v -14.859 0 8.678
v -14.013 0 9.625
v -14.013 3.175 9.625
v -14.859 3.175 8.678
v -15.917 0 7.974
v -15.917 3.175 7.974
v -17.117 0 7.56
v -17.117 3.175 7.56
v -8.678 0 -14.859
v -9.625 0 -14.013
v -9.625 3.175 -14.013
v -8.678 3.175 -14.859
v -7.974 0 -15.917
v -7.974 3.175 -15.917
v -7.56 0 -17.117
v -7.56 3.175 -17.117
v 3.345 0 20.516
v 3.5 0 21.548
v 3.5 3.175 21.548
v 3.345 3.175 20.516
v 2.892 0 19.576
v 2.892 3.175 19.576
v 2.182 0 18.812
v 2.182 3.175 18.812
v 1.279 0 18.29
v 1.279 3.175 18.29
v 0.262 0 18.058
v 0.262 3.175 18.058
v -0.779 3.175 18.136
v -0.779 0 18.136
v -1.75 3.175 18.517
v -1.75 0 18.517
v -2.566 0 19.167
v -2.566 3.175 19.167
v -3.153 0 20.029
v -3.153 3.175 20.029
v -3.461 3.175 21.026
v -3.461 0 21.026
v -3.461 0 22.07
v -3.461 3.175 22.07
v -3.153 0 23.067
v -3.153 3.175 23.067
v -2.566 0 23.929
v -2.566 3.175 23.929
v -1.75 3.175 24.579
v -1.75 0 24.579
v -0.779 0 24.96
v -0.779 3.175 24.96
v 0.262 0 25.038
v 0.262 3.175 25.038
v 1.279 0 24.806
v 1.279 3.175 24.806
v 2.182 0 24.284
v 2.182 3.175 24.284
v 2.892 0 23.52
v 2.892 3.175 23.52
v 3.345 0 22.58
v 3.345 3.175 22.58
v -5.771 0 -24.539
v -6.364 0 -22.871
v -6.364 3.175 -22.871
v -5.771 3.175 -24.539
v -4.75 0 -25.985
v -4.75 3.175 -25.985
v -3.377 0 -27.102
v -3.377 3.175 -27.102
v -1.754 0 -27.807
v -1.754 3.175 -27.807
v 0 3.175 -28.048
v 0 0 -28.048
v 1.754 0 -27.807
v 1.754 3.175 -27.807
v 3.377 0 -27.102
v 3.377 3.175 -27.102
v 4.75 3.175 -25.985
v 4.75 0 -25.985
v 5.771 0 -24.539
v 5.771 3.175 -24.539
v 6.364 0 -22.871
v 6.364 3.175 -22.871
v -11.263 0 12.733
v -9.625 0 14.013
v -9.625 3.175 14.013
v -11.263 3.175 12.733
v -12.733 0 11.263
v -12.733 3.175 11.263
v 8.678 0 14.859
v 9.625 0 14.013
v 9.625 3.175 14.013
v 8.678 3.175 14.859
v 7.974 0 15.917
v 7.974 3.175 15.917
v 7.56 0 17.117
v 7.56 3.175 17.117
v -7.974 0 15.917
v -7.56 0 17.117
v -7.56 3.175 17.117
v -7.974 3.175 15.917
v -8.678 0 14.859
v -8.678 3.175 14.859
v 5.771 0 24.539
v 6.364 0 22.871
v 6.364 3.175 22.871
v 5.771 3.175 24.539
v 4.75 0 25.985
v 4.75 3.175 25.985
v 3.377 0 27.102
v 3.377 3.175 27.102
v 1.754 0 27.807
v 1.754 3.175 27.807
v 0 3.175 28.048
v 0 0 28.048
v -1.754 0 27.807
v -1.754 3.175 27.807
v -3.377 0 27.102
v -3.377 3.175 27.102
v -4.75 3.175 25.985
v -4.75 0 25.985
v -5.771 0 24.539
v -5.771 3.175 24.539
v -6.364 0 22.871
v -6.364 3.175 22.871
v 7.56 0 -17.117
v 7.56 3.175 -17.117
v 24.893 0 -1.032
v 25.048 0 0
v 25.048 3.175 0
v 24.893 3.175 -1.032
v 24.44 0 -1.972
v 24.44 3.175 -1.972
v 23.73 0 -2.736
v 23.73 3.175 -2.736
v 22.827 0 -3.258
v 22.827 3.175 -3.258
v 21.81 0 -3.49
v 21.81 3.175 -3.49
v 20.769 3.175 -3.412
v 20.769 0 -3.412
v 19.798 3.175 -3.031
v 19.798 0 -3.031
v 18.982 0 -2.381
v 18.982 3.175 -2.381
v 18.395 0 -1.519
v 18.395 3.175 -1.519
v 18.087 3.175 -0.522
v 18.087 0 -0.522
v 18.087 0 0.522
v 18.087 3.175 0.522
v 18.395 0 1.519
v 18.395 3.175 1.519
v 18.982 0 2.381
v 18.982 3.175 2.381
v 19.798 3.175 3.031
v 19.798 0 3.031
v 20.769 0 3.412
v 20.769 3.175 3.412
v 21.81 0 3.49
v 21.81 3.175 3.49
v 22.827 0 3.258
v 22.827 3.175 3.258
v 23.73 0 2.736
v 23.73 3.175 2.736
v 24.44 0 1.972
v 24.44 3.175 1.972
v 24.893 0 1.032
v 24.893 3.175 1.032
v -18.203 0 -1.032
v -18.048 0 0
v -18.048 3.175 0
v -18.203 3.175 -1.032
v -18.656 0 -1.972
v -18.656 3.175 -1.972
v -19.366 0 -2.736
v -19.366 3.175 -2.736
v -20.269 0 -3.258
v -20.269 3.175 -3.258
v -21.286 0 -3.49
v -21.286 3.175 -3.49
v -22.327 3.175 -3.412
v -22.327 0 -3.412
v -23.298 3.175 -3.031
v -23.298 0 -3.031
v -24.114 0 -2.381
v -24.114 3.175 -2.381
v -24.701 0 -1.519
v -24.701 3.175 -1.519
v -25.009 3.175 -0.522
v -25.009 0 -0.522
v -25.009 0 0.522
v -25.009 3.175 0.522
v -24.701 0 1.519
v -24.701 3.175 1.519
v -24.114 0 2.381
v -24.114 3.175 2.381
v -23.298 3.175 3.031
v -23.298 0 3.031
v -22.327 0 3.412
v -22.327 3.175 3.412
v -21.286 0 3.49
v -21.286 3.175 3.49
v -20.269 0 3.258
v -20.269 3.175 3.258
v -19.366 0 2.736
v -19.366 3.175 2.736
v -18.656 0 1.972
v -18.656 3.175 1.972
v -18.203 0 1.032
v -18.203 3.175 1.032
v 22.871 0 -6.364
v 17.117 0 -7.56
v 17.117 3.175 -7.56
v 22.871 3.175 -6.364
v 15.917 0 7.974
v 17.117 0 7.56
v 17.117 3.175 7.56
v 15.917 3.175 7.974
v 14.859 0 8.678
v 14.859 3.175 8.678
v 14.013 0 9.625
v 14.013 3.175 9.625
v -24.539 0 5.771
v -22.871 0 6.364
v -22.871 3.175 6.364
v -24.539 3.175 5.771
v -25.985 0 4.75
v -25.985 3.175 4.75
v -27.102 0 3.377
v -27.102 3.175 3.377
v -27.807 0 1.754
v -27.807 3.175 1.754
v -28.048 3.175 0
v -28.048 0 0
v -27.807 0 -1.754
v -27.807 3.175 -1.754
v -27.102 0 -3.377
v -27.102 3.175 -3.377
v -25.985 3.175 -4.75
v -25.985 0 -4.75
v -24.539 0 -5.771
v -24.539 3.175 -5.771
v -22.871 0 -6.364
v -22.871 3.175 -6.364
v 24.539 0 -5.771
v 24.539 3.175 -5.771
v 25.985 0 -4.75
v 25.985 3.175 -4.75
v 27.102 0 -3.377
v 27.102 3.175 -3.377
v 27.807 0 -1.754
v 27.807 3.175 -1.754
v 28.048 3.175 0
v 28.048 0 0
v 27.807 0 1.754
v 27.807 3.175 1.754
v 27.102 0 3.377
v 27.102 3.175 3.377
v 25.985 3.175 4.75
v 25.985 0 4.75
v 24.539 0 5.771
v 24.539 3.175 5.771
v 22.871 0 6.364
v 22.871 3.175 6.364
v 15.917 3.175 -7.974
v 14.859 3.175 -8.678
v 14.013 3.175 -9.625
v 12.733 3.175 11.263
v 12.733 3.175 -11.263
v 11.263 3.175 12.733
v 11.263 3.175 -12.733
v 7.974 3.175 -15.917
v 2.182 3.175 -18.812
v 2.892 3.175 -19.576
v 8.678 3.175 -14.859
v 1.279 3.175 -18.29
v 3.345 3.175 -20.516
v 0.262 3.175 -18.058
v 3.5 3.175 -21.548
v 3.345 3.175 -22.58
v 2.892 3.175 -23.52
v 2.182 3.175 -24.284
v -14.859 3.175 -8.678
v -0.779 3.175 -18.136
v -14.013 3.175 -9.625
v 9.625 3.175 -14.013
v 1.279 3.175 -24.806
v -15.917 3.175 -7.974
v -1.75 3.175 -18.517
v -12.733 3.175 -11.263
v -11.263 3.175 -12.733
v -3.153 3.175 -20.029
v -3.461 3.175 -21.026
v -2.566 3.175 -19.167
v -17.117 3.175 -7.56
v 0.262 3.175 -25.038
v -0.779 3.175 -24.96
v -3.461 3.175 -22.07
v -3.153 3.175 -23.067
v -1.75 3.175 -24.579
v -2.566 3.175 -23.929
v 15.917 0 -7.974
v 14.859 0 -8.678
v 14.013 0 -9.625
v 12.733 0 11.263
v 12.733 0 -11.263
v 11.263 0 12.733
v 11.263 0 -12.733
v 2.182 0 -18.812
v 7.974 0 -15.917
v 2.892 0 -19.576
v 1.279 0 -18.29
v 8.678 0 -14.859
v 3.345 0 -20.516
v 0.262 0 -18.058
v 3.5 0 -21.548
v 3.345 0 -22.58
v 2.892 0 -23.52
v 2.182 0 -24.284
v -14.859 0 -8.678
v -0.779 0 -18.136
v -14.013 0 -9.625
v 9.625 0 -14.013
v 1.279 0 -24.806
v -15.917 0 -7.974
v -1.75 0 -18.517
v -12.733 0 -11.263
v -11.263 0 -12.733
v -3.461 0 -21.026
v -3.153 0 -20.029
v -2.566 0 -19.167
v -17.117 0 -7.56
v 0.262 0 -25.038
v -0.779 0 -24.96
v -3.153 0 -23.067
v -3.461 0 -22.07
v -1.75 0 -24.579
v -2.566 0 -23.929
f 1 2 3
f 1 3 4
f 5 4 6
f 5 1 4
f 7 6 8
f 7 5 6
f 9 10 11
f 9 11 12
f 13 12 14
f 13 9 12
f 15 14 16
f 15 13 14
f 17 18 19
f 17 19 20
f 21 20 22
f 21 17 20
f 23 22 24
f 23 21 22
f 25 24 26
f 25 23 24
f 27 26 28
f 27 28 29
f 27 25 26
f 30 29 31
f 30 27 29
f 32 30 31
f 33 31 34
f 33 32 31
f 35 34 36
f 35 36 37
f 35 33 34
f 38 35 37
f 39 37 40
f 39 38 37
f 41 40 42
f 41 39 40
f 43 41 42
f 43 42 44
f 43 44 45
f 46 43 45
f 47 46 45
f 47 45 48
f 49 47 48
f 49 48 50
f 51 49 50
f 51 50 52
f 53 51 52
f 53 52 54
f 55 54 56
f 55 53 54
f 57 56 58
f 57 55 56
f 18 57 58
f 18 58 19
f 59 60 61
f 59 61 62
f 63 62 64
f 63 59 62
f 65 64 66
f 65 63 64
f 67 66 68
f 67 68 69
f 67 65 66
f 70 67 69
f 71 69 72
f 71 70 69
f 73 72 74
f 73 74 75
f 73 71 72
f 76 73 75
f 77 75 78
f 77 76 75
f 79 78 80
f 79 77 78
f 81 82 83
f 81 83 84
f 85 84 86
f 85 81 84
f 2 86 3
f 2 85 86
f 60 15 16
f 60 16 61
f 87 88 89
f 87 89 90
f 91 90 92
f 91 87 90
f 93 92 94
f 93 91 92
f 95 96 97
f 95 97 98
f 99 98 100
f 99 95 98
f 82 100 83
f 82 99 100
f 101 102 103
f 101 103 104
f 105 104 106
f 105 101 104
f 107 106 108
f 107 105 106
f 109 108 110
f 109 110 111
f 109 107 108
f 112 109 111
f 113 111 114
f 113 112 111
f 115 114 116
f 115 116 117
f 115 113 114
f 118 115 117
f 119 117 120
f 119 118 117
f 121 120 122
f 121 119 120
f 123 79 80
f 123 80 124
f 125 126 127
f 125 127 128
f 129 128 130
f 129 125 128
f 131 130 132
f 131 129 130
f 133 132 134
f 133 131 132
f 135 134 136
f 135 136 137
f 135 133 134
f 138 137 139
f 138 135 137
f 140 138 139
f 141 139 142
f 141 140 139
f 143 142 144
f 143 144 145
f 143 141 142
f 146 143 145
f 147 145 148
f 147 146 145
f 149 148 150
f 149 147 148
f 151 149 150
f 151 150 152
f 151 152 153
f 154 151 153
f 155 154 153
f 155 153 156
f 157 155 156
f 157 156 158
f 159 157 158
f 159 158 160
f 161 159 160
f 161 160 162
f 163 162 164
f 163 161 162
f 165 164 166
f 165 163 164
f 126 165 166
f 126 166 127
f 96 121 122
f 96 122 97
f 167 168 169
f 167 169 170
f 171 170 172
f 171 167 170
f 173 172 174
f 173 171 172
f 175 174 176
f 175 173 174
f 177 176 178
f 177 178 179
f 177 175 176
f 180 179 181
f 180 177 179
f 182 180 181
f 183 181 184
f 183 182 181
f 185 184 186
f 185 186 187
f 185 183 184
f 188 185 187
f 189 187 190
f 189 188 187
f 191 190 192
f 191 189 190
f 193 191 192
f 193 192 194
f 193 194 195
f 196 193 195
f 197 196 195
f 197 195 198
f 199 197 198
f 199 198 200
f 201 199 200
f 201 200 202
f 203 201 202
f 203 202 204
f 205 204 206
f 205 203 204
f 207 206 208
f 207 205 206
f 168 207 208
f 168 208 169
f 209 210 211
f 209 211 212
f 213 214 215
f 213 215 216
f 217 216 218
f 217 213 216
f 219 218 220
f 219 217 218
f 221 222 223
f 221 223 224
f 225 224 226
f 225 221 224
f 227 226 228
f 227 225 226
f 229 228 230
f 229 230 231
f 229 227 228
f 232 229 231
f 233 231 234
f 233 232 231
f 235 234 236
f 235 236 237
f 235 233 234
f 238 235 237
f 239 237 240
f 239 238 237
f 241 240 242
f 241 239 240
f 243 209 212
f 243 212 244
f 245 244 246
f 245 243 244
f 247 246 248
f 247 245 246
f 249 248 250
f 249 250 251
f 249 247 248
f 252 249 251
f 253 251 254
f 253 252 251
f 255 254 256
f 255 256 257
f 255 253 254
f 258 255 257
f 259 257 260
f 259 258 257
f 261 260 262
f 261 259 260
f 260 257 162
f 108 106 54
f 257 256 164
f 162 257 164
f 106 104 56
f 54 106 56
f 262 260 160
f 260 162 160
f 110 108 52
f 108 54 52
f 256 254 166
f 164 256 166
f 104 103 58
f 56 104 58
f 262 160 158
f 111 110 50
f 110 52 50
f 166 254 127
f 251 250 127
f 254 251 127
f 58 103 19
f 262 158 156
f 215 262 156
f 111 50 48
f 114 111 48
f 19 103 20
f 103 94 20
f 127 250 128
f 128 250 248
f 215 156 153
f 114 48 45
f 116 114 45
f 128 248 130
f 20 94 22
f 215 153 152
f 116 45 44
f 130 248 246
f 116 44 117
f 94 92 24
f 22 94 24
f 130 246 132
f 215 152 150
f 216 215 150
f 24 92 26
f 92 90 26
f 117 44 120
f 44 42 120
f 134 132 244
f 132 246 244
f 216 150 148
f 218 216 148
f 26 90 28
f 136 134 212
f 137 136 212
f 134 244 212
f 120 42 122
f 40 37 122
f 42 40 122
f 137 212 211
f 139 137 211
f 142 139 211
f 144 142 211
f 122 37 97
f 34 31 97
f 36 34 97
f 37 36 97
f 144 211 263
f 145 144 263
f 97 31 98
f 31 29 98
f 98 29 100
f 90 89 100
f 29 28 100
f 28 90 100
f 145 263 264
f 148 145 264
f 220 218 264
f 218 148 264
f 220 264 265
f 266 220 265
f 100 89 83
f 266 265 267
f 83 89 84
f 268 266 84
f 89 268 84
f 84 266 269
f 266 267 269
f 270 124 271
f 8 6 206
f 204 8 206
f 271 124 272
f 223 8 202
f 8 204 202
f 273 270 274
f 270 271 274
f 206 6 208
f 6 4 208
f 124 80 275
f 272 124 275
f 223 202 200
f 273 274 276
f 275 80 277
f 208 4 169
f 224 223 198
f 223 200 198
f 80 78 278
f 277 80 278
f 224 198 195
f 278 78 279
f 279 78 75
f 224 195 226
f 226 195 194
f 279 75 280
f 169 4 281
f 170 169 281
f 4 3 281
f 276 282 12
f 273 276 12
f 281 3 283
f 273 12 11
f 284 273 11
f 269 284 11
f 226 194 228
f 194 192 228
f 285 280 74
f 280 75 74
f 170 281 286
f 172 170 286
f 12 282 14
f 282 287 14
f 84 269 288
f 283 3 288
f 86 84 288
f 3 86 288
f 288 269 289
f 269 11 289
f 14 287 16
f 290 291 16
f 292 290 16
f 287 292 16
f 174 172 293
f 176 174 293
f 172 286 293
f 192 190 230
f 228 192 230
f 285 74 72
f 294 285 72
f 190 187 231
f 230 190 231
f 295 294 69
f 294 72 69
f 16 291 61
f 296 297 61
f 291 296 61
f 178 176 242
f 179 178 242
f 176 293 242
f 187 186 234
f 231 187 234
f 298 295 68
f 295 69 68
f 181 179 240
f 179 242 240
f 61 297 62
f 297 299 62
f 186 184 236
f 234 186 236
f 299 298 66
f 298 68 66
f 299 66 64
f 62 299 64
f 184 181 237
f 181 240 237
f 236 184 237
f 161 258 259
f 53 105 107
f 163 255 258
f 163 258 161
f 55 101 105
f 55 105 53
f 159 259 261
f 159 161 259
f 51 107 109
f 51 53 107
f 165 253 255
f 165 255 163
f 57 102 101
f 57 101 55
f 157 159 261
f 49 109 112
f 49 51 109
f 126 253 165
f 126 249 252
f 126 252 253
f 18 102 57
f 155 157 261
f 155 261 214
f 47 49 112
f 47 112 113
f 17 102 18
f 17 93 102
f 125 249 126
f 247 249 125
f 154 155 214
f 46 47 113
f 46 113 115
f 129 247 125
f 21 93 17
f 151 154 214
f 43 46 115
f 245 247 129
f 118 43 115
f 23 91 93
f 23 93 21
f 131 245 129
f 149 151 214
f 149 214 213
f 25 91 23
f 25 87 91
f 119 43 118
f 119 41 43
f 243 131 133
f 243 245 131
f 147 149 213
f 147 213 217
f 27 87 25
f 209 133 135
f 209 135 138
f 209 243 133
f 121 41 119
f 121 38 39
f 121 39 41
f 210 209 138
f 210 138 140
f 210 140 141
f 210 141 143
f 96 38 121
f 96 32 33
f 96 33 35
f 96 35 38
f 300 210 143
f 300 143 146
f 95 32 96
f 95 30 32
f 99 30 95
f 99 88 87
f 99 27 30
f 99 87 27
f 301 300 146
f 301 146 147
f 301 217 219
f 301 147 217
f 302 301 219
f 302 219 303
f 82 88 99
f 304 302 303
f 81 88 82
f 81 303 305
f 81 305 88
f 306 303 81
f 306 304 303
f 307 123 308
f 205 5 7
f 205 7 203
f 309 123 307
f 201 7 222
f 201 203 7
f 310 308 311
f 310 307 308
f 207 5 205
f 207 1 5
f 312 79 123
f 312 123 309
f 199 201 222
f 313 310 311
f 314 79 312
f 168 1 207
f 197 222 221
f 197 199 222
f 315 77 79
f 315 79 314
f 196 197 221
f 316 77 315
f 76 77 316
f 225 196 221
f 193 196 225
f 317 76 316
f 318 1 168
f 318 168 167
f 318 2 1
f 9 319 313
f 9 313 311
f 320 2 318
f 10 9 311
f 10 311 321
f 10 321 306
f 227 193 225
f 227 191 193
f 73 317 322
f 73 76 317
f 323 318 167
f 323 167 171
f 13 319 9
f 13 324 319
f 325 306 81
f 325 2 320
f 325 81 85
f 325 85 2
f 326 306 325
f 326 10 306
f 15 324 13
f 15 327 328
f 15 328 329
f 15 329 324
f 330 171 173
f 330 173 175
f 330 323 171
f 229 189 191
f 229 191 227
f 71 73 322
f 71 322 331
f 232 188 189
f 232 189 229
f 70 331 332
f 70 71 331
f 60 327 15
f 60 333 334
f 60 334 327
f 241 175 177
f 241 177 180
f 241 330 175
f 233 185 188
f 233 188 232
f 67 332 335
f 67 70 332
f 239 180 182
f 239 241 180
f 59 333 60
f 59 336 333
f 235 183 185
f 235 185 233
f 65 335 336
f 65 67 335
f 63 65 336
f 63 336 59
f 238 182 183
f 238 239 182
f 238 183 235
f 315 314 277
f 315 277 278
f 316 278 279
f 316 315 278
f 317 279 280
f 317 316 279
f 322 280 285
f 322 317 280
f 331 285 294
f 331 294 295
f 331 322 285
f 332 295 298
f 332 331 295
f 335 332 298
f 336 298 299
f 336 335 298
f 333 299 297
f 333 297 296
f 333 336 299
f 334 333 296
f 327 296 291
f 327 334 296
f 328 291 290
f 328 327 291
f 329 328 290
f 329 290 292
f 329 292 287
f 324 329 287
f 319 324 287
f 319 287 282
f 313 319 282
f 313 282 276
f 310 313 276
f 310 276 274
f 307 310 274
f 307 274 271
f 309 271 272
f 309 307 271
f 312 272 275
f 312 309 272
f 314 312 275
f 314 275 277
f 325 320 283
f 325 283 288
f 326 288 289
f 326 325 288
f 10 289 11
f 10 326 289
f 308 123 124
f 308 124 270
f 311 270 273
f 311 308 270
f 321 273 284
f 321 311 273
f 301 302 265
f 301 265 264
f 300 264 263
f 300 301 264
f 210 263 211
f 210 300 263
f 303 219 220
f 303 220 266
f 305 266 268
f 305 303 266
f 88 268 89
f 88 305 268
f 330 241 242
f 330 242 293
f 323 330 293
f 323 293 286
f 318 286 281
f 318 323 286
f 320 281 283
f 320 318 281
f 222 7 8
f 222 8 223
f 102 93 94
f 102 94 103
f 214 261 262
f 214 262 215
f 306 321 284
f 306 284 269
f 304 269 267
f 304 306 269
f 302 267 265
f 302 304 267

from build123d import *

# Parameters (mm, degrees)
SKETCH1_R           = 3.5
BOSS_EXTRUDE1_DEPTH = 3.175


with BuildPart() as part:
    # Sketch1 → Boss-Extrude1 (new body)
    with BuildSketch(Plane(origin=(0, 0, 0), x_dir=(1, 0, 0), z_dir=(0, 1, 0))):
        with BuildLine():
            Line((-7.559940761, 17.117095983), (-6.363973726, 22.870814531))
            ThreePointArc((-6.363973726, 22.870814531), (0, 28.04799995), (6.363973726, 22.870814531))
            Line((6.363973726, 22.870814531), (7.559940761, 17.117095983))
            ThreePointArc((7.559940761, 17.117095983), (8.292150293, 15.365504727), (9.624553992, 14.013135283))
            ThreePointArc((9.624553992, 14.013135283), (12.02081528, 12.02081528), (14.013135283, 9.624553992))
            ThreePointArc((14.013135283, 9.624553992), (15.365504727, 8.292150293), (17.117095983, 7.559940761))
            Line((17.117095983, 7.559940761), (22.870814531, 6.363973726))
            ThreePointArc((22.870814531, 6.363973726), (28.04799995, 0), (22.870814531, -6.363973726))
            Line((22.870814531, -6.363973726), (17.117095983, -7.559940761))
            ThreePointArc((17.117095983, -7.559940761), (15.365504727, -8.292150293), (14.013135283, -9.624553992))
            ThreePointArc((14.013135283, -9.624553992), (12.02081528, -12.02081528), (9.624553992, -14.013135283))
            ThreePointArc((9.624553992, -14.013135283), (8.292150293, -15.365504727), (7.559940761, -17.117095983))
            Line((7.559940761, -17.117095983), (6.363973726, -22.870814531))
            ThreePointArc((6.363973726, -22.870814531), (0, -28.04799995), (-6.363973726, -22.870814531))
            Line((-6.363973726, -22.870814531), (-7.559940761, -17.117095983))
            ThreePointArc((-7.559940761, -17.117095983), (-8.292150293, -15.365504727), (-9.624553992, -14.013135283))
            ThreePointArc((-9.624553992, -14.013135283), (-12.02081528, -12.02081528), (-14.013135283, -9.624553992))
            ThreePointArc((-14.013135283, -9.624553992), (-15.365504727, -8.292150293), (-17.117095983, -7.559940761))
            Line((-17.117095983, -7.559940761), (-22.870814531, -6.363973726))
            ThreePointArc((-22.870814531, -6.363973726), (-28.04799995, 0), (-22.870814531, 6.363973726))
            Line((-22.870814531, 6.363973726), (-17.117095983, 7.559940761))
            ThreePointArc((-17.117095983, 7.559940761), (-15.365504727, 8.292150293), (-14.013135283, 9.624553992))
            ThreePointArc((-14.013135283, 9.624553992), (-12.02081528, 12.02081528), (-9.624553992, 14.013135283))
            ThreePointArc((-9.624553992, 14.013135283), (-8.292150293, 15.365504727), (-7.559940761, 17.117095983))
        make_face()
        with Locations((0, 21.54799995)):
            Circle(SKETCH1_R, mode=Mode.SUBTRACT)
        with Locations((21.54799995, 0)):
            Circle(SKETCH1_R, mode=Mode.SUBTRACT)
        with Locations((0, -21.54799995)):
            Circle(SKETCH1_R, mode=Mode.SUBTRACT)
        with Locations((-21.54799995, 0)):
            Circle(SKETCH1_R, mode=Mode.SUBTRACT)
    extrude(amount=BOSS_EXTRUDE1_DEPTH)


solid = part.part
